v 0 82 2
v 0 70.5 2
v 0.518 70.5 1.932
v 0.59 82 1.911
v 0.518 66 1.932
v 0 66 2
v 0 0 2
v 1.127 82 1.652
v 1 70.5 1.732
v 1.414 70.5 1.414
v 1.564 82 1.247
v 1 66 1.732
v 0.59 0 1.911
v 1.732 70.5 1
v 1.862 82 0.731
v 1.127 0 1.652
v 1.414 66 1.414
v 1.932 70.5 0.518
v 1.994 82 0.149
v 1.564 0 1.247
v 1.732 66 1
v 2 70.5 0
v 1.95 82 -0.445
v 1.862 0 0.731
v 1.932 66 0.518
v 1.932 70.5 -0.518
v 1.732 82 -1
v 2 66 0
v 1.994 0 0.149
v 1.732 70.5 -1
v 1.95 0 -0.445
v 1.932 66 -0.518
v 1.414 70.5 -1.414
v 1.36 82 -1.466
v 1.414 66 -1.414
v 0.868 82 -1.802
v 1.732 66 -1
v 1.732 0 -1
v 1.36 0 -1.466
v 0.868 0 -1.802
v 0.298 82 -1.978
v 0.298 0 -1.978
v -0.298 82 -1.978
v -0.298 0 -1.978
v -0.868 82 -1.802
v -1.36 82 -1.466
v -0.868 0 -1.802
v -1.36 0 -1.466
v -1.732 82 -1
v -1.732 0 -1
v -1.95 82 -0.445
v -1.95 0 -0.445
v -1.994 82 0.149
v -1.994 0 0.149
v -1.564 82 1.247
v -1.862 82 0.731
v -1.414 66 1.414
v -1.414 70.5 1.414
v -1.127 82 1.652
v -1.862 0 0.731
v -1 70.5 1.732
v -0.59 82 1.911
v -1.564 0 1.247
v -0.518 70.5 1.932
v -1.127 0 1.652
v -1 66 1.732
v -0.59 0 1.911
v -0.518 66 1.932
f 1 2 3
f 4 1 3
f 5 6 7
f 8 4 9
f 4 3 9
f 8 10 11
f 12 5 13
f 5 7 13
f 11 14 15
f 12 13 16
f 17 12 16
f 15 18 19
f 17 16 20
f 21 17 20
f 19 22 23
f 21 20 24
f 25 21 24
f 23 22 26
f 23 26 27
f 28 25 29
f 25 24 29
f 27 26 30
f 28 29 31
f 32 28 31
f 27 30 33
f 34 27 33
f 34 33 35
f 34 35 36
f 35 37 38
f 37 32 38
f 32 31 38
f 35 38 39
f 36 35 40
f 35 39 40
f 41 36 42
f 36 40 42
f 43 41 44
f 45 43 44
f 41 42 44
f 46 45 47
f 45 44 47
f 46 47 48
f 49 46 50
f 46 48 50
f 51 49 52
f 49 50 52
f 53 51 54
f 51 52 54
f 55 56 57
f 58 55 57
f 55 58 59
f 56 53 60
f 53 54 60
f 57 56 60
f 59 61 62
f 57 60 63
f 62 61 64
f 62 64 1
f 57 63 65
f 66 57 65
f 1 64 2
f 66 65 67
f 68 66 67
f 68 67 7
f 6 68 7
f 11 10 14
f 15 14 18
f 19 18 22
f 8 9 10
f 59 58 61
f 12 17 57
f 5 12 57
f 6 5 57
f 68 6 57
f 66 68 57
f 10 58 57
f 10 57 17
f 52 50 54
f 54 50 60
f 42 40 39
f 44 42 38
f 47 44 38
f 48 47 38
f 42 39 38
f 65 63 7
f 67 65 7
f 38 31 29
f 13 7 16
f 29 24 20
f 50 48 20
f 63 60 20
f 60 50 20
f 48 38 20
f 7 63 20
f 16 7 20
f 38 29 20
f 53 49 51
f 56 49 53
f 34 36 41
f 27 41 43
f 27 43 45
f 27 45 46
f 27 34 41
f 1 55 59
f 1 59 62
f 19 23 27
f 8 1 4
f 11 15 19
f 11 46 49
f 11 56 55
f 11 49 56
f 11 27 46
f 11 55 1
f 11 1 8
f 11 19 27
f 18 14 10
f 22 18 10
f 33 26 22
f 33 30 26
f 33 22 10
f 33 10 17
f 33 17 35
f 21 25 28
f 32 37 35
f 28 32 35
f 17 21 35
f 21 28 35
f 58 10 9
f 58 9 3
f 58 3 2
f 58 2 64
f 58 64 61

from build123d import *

# Parameters (mm, degrees)
CROQUIS1_R              = 2
SALIENTE_EXTRUIR1_DEPTH = 82
CORTAR_EXTRUIR1_DEPTH   = 4.5


with BuildPart() as part:
    # Croquis1 → Saliente-Extruir1 (new body)
    with BuildSketch(Plane(origin=(0, 0, 0), x_dir=(1, 0, 0), z_dir=(0, 1, 0))):
        with Locations(Location((0, 0, 0), (0, 0, 270))):
            Circle(CROQUIS1_R)
    extrude(amount=SALIENTE_EXTRUIR1_DEPTH)

    # Croquis2 → Cortar-Extruir1 (cut)
    with BuildSketch(Plane(origin=(0, 70.5, 0), x_dir=(1, 0, 0), z_dir=(0, 1, 0))):
        Polygon((2, -2), (-1.414213562, -2), (-1.414213562, -1.414213562), (1.414213562, -1.414213562), (1.414213562, 1.414213562), (2, 1.414213562), align=None)
    extrude(amount=-CORTAR_EXTRUIR1_DEPTH, mode=Mode.SUBTRACT)


solid = part.part
